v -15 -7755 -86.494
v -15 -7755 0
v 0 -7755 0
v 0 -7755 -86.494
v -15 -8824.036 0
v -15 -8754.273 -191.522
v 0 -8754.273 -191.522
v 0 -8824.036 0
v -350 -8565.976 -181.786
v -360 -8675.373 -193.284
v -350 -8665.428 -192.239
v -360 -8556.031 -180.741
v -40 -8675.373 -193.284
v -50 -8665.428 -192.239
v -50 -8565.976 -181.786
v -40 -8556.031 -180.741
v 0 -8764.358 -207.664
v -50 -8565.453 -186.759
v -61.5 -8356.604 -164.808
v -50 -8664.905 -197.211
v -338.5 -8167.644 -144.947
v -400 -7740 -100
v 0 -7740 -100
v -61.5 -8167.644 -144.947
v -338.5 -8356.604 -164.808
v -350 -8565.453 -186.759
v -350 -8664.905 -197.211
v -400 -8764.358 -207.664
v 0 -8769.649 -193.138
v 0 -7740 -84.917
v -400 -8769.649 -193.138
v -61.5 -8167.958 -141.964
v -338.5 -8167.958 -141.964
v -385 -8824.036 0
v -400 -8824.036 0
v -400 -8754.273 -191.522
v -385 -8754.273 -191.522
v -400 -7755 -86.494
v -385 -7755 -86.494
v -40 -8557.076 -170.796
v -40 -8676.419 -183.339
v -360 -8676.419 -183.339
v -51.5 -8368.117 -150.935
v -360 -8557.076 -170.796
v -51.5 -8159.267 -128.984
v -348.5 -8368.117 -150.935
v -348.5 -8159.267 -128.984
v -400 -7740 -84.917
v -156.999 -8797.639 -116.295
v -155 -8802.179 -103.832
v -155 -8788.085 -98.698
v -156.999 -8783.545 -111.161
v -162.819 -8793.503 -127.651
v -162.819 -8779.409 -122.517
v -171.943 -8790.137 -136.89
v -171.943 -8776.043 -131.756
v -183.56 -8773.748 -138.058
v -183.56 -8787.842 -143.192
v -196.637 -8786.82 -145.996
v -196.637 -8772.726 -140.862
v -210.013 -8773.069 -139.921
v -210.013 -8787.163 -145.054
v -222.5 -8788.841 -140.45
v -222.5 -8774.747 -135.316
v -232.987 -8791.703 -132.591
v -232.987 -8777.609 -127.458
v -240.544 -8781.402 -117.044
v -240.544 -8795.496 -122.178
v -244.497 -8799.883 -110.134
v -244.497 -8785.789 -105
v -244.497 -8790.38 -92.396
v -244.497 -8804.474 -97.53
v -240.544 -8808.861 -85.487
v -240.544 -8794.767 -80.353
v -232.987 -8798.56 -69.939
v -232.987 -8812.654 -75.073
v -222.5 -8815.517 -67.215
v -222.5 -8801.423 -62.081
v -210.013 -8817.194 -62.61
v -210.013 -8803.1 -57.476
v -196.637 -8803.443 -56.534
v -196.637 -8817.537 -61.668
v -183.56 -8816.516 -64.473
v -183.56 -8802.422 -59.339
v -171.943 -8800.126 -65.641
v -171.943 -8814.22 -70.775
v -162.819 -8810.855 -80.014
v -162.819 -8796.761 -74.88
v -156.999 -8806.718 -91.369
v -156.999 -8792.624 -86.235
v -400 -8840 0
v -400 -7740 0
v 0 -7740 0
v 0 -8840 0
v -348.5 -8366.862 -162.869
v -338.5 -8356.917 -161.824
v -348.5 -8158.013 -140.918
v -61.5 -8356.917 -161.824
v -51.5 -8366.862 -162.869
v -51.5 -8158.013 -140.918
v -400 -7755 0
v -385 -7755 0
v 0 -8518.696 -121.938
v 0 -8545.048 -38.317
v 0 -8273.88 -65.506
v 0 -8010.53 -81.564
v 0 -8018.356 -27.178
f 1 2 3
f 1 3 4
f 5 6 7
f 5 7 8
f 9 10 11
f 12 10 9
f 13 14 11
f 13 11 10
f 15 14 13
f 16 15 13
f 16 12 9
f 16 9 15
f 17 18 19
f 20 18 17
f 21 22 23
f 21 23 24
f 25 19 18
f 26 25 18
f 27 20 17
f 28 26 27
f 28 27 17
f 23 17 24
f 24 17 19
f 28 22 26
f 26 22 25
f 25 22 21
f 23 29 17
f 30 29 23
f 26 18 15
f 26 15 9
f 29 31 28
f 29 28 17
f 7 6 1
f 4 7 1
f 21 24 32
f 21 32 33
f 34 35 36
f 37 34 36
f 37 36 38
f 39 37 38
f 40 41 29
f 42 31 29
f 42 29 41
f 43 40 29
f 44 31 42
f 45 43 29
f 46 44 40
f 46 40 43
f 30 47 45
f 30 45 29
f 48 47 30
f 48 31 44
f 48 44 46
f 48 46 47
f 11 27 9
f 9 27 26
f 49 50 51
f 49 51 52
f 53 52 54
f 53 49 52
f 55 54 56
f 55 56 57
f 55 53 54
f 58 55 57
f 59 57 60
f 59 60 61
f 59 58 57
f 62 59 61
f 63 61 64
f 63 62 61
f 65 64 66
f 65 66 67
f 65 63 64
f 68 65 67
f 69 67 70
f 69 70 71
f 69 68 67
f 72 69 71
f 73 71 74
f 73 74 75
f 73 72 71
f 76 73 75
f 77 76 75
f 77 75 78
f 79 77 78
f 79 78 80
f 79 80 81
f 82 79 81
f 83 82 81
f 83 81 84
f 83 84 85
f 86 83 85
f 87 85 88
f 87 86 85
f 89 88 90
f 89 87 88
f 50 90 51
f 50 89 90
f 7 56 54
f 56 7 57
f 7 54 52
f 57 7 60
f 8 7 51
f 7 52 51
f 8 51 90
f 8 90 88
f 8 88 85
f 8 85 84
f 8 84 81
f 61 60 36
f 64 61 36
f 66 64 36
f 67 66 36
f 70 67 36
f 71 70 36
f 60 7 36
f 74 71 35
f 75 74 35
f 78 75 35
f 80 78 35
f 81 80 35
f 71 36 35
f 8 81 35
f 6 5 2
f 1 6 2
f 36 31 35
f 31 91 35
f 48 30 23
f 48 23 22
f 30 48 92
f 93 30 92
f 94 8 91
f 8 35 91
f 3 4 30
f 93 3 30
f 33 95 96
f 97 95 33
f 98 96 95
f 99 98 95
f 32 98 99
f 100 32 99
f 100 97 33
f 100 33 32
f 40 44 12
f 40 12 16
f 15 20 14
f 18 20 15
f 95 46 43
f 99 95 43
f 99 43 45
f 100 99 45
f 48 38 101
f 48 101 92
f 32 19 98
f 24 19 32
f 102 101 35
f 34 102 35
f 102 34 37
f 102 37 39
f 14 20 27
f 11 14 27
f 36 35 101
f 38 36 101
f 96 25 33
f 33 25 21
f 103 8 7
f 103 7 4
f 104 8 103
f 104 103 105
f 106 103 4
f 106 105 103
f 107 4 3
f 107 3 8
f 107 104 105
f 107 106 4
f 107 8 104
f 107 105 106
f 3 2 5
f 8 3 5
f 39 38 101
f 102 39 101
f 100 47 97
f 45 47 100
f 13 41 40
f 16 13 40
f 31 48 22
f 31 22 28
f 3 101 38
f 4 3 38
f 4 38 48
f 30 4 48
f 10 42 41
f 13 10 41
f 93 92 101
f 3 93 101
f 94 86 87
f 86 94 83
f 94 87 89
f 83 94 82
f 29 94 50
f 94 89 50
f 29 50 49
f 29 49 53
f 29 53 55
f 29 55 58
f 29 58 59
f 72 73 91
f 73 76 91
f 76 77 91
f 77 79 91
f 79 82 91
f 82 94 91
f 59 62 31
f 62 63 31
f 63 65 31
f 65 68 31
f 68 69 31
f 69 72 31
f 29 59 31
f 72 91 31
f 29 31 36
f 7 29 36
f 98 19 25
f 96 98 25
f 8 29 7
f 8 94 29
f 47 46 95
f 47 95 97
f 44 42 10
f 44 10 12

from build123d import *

# Parameters (mm, degrees)
SKETCH6_W          = 300
SKETCH6_H          = 100
SKETCH6_W_2        = 277
SKETCH6_H_2        = 190
CUT_EXTRUDE1_DEPTH = 50
SHELL1_T           = -15
SKETCH7_R          = 45
CUT_EXTRUDE2_DEPTH = 50
SPLIT3_START       = -400
SPLIT3_DEPTH       = 154.9999999
SPLIT3_START_2     = -154.9999999
SPLIT3_2_DEPTH     = 154.9999999
SPLIT3_START_3     = -245.0000001
SPLIT3_3_DEPTH     = 90.0000002
SPLIT3_START_4     = -8306.126404087
SPLIT3_4_OUTLINE_R = 45
SPLIT3_4_DEPTH     = 15
SPLIT3_5_DEPTH     = 385
SPLIT3_6_DEPTH     = 155.9999999
SPLIT3_7_DEPTH     = 15
SPLIT3_8_DEPTH     = 400
SKETCH9_W          = 297
SKETCH9_H          = 210
CUT_EXTRUDE3_DEPTH = 12
SKETCH10_W         = 320
SKETCH10_H         = 120
CUT_EXTRUDE4_DEPTH = 10


with BuildPart() as part:
    # Sketch4 → Loft1 section 0
    with BuildSketch(Plane(origin=(0, -74.173200619, 705.710863428), x_dir=(1, 0, 0), z_dir=(0, 0.10452846326765355, -0.9945218953682733))):
        with BuildLine():
            Line((0, 7708.052316477), (-400, 7708.052316477))
            Line((-400, 7708.052316477), (-400, 8738.052316477))
            Line((-400, 8738.052316477), (0, 8738.052316477))
            Line((0, 8738.052316477), (0, 7708.052316477))
        make_face()
    # Sketch2 → Loft1 section 1
    with BuildSketch(Plane.XY):
        with BuildLine():
            Line((0, -7740), (-400, -7740))
            Line((-400, -7740), (-400, -8840))
            Line((-400, -8840), (0, -8840))
            Line((0, -8840), (0, -7740))
        make_face()
    loft()

    # Sketch6 → Cut-Extrude1 (cut)
    with BuildSketch(Plane(origin=(0, -74.173200619, 705.710863428), x_dir=(-1, 0, 0), z_dir=(0, 0.1045284632676537, -0.9945218953682733))):
        with Locations((200, -8588.052316477)):
            Rectangle(SKETCH6_W, SKETCH6_H)
        with Locations((200, -8233.052316477)):
            Rectangle(SKETCH6_W_2, SKETCH6_H_2)
    extrude(amount=-CUT_EXTRUDE1_DEPTH, mode=Mode.SUBTRACT)

    # Shell1
    shell1_openings = [part.faces().sort_by_distance(p)[0] for p in [
        (-200, -8290, 0),
        (-200, -8667.518574274, -172.348423455),
        (-350, -8617.792479506, -167.122000291),
        (-200, -8568.066384737, -161.895577128),
        (-50, -8617.792479506, -167.122000291),
        (-61.5, -8264.73720665, -130.014395831),
        (-200, -8359.21678671, -139.944599842),
        (-338.5, -8264.73720665, -130.014395831),
        (-200, -8170.25762659, -120.084191821),
        (-200, -8620.405691087, -142.258952907),
        (-200, -8267.350418232, -105.151348447),
    ]]
    offset(amount=SHELL1_T, openings=shell1_openings, kind=Kind.INTERSECTION)

    # Sketch7 → Cut-Extrude2 (cut)
    with BuildSketch(Plane(origin=(0, -7804.495004601, -2842.814373791), x_dir=(1, 0, 0), z_dir=(0, -0.9396070592858664, -0.3422551301882362))):
        with Locations(Location((-200, 2915.029413774, 0), (0, 0, 270))):
            Circle(SKETCH7_R)
    extrude(amount=-CUT_EXTRUDE2_DEPTH, mode=Mode.SUBTRACT)


with BuildPart() as body_2:
    # Split2: the piece on the far side of the plane
    add(part.part)
    split(bisect_by=Plane(origin=(0, -75.741127568, 720.628691859), x_dir=(0, 0.9945218953682734, 0.1045284632676536), z_dir=(0, -0.1045284632676536, 0.9945218953682734)), keep=Keep.BOTTOM)

    # Sketch9 → Cut-Extrude3 (cut)
    with BuildSketch(Plane(origin=(0, -75.741127568, 720.628691859), x_dir=(1, 0, 0), z_dir=(0, -0.1045284632676536, 0.9945218953682734))):
        with Locations((-200, -8233.052316477)):
            Rectangle(SKETCH9_W, SKETCH9_H)
    extrude(amount=-CUT_EXTRUDE3_DEPTH, mode=Mode.SUBTRACT)

    # Sketch10 → Cut-Extrude4 (cut)
    with BuildSketch(Plane(origin=(0, -75.741127568, 720.628691859), x_dir=(1, 0, 0), z_dir=(0, -0.1045284632676536, 0.9945218953682734))):
        with Locations((-200, -8588.052316477)):
            Rectangle(SKETCH10_W, SKETCH10_H)
    extrude(amount=-CUT_EXTRUDE4_DEPTH, mode=Mode.SUBTRACT)


with BuildPart() as part_1:
    add(part.part)

    # Split2
    split(bisect_by=Plane(origin=(0, -75.741127568, 720.628691859), x_dir=(0, 0.9945218953682734, 0.1045284632676536), z_dir=(0, -0.1045284632676536, 0.9945218953682734)), keep=Keep.TOP)

    # Split3 5 outline → Split3 5 (cut)
    with BuildSketch(Plane.YZ.offset(SPLIT3_START)):
        Polygon((-8769.648874346, -193.137833337), (-7740, -84.917375807), (-7740, 0), (-8840, 0), align=None)
    extrude(amount=SPLIT3_5_DEPTH, mode=Mode.SUBTRACT)

    # Split3 6 outline → Split3 6 (cut)
    with BuildSketch(Plane.YZ.offset(SPLIT3_START_2)):
        Polygon((-8769.648874346, -193.137833337), (-8754.273397877, -191.521805641), (-8824.035879838, 0), (-8840, 0), align=None)
        Polygon((-7755, 0), (-7755, -86.493939336), (-7740, -84.917375807), (-7740, 0), align=None)
    extrude(amount=SPLIT3_6_DEPTH, mode=Mode.SUBTRACT)


with BuildPart() as body_3:
    # Split3: read off the stored shape, not the designer's step
    # Split3 outline → Split3 (new body)
    with BuildSketch(Plane.YZ.offset(SPLIT3_START)):
        Polygon((-8769.648874346, -193.137833337), (-8754.273397877, -191.521805641), (-8824.035879838, 0), (-8840, 0), align=None)
    extrude(amount=SPLIT3_DEPTH)

    # Split3 2 outline → Split3 2 (add)
    with BuildSketch(Plane.YZ.offset(SPLIT3_START_2)):
        Polygon((-8769.648874346, -193.137833337), (-8754.273397877, -191.521805641), (-8824.035879838, 0), (-8840, 0), align=None)
    extrude(amount=SPLIT3_2_DEPTH)

    # Split3 3 outline → Split3 3 (add)
    with BuildSketch(Plane.YZ.offset(SPLIT3_START_3)):
        Polygon((-8769.648874346, -193.137833337), (-8754.273397877, -191.521805641), (-8824.035879838, 0), (-8840, 0), align=None)
    extrude(amount=SPLIT3_3_DEPTH)

    # Split3 4 outline → Split3 4 (cut)
    with BuildSketch(Plane(origin=(0, 0, 0), x_dir=(1, 0, 0), z_dir=(0, 0.9396070592858664, 0.34225513018823617)).offset(SPLIT3_START_4)):
        with Locations((-200, -2915.029413774)):
            Circle(SPLIT3_4_OUTLINE_R)
    extrude(amount=SPLIT3_4_DEPTH, mode=Mode.SUBTRACT)


with BuildPart() as body_4:
    # Split3 7 outline → Split3 7 (new body)
    with BuildSketch(Plane.YZ.offset(SPLIT3_START)):
        Polygon((-8824.035879838, 0), (-8754.273397877, -191.521805641), (-7755, -86.493939336), (-7755, 0), align=None)
    extrude(amount=SPLIT3_7_DEPTH)


with BuildPart() as body_5:
    # Split3 8 outline → Split3 8 (new body)
    with BuildSketch(Plane.YZ.offset(SPLIT3_START)):
        Polygon((-7740, 0), (-7755, 0), (-7755, -86.493939336), (-7740, -84.917375807), align=None)
    extrude(amount=SPLIT3_8_DEPTH)


solid = Compound([body_2.part, part_1.part, body_3.part, body_4.part, body_5.part])
